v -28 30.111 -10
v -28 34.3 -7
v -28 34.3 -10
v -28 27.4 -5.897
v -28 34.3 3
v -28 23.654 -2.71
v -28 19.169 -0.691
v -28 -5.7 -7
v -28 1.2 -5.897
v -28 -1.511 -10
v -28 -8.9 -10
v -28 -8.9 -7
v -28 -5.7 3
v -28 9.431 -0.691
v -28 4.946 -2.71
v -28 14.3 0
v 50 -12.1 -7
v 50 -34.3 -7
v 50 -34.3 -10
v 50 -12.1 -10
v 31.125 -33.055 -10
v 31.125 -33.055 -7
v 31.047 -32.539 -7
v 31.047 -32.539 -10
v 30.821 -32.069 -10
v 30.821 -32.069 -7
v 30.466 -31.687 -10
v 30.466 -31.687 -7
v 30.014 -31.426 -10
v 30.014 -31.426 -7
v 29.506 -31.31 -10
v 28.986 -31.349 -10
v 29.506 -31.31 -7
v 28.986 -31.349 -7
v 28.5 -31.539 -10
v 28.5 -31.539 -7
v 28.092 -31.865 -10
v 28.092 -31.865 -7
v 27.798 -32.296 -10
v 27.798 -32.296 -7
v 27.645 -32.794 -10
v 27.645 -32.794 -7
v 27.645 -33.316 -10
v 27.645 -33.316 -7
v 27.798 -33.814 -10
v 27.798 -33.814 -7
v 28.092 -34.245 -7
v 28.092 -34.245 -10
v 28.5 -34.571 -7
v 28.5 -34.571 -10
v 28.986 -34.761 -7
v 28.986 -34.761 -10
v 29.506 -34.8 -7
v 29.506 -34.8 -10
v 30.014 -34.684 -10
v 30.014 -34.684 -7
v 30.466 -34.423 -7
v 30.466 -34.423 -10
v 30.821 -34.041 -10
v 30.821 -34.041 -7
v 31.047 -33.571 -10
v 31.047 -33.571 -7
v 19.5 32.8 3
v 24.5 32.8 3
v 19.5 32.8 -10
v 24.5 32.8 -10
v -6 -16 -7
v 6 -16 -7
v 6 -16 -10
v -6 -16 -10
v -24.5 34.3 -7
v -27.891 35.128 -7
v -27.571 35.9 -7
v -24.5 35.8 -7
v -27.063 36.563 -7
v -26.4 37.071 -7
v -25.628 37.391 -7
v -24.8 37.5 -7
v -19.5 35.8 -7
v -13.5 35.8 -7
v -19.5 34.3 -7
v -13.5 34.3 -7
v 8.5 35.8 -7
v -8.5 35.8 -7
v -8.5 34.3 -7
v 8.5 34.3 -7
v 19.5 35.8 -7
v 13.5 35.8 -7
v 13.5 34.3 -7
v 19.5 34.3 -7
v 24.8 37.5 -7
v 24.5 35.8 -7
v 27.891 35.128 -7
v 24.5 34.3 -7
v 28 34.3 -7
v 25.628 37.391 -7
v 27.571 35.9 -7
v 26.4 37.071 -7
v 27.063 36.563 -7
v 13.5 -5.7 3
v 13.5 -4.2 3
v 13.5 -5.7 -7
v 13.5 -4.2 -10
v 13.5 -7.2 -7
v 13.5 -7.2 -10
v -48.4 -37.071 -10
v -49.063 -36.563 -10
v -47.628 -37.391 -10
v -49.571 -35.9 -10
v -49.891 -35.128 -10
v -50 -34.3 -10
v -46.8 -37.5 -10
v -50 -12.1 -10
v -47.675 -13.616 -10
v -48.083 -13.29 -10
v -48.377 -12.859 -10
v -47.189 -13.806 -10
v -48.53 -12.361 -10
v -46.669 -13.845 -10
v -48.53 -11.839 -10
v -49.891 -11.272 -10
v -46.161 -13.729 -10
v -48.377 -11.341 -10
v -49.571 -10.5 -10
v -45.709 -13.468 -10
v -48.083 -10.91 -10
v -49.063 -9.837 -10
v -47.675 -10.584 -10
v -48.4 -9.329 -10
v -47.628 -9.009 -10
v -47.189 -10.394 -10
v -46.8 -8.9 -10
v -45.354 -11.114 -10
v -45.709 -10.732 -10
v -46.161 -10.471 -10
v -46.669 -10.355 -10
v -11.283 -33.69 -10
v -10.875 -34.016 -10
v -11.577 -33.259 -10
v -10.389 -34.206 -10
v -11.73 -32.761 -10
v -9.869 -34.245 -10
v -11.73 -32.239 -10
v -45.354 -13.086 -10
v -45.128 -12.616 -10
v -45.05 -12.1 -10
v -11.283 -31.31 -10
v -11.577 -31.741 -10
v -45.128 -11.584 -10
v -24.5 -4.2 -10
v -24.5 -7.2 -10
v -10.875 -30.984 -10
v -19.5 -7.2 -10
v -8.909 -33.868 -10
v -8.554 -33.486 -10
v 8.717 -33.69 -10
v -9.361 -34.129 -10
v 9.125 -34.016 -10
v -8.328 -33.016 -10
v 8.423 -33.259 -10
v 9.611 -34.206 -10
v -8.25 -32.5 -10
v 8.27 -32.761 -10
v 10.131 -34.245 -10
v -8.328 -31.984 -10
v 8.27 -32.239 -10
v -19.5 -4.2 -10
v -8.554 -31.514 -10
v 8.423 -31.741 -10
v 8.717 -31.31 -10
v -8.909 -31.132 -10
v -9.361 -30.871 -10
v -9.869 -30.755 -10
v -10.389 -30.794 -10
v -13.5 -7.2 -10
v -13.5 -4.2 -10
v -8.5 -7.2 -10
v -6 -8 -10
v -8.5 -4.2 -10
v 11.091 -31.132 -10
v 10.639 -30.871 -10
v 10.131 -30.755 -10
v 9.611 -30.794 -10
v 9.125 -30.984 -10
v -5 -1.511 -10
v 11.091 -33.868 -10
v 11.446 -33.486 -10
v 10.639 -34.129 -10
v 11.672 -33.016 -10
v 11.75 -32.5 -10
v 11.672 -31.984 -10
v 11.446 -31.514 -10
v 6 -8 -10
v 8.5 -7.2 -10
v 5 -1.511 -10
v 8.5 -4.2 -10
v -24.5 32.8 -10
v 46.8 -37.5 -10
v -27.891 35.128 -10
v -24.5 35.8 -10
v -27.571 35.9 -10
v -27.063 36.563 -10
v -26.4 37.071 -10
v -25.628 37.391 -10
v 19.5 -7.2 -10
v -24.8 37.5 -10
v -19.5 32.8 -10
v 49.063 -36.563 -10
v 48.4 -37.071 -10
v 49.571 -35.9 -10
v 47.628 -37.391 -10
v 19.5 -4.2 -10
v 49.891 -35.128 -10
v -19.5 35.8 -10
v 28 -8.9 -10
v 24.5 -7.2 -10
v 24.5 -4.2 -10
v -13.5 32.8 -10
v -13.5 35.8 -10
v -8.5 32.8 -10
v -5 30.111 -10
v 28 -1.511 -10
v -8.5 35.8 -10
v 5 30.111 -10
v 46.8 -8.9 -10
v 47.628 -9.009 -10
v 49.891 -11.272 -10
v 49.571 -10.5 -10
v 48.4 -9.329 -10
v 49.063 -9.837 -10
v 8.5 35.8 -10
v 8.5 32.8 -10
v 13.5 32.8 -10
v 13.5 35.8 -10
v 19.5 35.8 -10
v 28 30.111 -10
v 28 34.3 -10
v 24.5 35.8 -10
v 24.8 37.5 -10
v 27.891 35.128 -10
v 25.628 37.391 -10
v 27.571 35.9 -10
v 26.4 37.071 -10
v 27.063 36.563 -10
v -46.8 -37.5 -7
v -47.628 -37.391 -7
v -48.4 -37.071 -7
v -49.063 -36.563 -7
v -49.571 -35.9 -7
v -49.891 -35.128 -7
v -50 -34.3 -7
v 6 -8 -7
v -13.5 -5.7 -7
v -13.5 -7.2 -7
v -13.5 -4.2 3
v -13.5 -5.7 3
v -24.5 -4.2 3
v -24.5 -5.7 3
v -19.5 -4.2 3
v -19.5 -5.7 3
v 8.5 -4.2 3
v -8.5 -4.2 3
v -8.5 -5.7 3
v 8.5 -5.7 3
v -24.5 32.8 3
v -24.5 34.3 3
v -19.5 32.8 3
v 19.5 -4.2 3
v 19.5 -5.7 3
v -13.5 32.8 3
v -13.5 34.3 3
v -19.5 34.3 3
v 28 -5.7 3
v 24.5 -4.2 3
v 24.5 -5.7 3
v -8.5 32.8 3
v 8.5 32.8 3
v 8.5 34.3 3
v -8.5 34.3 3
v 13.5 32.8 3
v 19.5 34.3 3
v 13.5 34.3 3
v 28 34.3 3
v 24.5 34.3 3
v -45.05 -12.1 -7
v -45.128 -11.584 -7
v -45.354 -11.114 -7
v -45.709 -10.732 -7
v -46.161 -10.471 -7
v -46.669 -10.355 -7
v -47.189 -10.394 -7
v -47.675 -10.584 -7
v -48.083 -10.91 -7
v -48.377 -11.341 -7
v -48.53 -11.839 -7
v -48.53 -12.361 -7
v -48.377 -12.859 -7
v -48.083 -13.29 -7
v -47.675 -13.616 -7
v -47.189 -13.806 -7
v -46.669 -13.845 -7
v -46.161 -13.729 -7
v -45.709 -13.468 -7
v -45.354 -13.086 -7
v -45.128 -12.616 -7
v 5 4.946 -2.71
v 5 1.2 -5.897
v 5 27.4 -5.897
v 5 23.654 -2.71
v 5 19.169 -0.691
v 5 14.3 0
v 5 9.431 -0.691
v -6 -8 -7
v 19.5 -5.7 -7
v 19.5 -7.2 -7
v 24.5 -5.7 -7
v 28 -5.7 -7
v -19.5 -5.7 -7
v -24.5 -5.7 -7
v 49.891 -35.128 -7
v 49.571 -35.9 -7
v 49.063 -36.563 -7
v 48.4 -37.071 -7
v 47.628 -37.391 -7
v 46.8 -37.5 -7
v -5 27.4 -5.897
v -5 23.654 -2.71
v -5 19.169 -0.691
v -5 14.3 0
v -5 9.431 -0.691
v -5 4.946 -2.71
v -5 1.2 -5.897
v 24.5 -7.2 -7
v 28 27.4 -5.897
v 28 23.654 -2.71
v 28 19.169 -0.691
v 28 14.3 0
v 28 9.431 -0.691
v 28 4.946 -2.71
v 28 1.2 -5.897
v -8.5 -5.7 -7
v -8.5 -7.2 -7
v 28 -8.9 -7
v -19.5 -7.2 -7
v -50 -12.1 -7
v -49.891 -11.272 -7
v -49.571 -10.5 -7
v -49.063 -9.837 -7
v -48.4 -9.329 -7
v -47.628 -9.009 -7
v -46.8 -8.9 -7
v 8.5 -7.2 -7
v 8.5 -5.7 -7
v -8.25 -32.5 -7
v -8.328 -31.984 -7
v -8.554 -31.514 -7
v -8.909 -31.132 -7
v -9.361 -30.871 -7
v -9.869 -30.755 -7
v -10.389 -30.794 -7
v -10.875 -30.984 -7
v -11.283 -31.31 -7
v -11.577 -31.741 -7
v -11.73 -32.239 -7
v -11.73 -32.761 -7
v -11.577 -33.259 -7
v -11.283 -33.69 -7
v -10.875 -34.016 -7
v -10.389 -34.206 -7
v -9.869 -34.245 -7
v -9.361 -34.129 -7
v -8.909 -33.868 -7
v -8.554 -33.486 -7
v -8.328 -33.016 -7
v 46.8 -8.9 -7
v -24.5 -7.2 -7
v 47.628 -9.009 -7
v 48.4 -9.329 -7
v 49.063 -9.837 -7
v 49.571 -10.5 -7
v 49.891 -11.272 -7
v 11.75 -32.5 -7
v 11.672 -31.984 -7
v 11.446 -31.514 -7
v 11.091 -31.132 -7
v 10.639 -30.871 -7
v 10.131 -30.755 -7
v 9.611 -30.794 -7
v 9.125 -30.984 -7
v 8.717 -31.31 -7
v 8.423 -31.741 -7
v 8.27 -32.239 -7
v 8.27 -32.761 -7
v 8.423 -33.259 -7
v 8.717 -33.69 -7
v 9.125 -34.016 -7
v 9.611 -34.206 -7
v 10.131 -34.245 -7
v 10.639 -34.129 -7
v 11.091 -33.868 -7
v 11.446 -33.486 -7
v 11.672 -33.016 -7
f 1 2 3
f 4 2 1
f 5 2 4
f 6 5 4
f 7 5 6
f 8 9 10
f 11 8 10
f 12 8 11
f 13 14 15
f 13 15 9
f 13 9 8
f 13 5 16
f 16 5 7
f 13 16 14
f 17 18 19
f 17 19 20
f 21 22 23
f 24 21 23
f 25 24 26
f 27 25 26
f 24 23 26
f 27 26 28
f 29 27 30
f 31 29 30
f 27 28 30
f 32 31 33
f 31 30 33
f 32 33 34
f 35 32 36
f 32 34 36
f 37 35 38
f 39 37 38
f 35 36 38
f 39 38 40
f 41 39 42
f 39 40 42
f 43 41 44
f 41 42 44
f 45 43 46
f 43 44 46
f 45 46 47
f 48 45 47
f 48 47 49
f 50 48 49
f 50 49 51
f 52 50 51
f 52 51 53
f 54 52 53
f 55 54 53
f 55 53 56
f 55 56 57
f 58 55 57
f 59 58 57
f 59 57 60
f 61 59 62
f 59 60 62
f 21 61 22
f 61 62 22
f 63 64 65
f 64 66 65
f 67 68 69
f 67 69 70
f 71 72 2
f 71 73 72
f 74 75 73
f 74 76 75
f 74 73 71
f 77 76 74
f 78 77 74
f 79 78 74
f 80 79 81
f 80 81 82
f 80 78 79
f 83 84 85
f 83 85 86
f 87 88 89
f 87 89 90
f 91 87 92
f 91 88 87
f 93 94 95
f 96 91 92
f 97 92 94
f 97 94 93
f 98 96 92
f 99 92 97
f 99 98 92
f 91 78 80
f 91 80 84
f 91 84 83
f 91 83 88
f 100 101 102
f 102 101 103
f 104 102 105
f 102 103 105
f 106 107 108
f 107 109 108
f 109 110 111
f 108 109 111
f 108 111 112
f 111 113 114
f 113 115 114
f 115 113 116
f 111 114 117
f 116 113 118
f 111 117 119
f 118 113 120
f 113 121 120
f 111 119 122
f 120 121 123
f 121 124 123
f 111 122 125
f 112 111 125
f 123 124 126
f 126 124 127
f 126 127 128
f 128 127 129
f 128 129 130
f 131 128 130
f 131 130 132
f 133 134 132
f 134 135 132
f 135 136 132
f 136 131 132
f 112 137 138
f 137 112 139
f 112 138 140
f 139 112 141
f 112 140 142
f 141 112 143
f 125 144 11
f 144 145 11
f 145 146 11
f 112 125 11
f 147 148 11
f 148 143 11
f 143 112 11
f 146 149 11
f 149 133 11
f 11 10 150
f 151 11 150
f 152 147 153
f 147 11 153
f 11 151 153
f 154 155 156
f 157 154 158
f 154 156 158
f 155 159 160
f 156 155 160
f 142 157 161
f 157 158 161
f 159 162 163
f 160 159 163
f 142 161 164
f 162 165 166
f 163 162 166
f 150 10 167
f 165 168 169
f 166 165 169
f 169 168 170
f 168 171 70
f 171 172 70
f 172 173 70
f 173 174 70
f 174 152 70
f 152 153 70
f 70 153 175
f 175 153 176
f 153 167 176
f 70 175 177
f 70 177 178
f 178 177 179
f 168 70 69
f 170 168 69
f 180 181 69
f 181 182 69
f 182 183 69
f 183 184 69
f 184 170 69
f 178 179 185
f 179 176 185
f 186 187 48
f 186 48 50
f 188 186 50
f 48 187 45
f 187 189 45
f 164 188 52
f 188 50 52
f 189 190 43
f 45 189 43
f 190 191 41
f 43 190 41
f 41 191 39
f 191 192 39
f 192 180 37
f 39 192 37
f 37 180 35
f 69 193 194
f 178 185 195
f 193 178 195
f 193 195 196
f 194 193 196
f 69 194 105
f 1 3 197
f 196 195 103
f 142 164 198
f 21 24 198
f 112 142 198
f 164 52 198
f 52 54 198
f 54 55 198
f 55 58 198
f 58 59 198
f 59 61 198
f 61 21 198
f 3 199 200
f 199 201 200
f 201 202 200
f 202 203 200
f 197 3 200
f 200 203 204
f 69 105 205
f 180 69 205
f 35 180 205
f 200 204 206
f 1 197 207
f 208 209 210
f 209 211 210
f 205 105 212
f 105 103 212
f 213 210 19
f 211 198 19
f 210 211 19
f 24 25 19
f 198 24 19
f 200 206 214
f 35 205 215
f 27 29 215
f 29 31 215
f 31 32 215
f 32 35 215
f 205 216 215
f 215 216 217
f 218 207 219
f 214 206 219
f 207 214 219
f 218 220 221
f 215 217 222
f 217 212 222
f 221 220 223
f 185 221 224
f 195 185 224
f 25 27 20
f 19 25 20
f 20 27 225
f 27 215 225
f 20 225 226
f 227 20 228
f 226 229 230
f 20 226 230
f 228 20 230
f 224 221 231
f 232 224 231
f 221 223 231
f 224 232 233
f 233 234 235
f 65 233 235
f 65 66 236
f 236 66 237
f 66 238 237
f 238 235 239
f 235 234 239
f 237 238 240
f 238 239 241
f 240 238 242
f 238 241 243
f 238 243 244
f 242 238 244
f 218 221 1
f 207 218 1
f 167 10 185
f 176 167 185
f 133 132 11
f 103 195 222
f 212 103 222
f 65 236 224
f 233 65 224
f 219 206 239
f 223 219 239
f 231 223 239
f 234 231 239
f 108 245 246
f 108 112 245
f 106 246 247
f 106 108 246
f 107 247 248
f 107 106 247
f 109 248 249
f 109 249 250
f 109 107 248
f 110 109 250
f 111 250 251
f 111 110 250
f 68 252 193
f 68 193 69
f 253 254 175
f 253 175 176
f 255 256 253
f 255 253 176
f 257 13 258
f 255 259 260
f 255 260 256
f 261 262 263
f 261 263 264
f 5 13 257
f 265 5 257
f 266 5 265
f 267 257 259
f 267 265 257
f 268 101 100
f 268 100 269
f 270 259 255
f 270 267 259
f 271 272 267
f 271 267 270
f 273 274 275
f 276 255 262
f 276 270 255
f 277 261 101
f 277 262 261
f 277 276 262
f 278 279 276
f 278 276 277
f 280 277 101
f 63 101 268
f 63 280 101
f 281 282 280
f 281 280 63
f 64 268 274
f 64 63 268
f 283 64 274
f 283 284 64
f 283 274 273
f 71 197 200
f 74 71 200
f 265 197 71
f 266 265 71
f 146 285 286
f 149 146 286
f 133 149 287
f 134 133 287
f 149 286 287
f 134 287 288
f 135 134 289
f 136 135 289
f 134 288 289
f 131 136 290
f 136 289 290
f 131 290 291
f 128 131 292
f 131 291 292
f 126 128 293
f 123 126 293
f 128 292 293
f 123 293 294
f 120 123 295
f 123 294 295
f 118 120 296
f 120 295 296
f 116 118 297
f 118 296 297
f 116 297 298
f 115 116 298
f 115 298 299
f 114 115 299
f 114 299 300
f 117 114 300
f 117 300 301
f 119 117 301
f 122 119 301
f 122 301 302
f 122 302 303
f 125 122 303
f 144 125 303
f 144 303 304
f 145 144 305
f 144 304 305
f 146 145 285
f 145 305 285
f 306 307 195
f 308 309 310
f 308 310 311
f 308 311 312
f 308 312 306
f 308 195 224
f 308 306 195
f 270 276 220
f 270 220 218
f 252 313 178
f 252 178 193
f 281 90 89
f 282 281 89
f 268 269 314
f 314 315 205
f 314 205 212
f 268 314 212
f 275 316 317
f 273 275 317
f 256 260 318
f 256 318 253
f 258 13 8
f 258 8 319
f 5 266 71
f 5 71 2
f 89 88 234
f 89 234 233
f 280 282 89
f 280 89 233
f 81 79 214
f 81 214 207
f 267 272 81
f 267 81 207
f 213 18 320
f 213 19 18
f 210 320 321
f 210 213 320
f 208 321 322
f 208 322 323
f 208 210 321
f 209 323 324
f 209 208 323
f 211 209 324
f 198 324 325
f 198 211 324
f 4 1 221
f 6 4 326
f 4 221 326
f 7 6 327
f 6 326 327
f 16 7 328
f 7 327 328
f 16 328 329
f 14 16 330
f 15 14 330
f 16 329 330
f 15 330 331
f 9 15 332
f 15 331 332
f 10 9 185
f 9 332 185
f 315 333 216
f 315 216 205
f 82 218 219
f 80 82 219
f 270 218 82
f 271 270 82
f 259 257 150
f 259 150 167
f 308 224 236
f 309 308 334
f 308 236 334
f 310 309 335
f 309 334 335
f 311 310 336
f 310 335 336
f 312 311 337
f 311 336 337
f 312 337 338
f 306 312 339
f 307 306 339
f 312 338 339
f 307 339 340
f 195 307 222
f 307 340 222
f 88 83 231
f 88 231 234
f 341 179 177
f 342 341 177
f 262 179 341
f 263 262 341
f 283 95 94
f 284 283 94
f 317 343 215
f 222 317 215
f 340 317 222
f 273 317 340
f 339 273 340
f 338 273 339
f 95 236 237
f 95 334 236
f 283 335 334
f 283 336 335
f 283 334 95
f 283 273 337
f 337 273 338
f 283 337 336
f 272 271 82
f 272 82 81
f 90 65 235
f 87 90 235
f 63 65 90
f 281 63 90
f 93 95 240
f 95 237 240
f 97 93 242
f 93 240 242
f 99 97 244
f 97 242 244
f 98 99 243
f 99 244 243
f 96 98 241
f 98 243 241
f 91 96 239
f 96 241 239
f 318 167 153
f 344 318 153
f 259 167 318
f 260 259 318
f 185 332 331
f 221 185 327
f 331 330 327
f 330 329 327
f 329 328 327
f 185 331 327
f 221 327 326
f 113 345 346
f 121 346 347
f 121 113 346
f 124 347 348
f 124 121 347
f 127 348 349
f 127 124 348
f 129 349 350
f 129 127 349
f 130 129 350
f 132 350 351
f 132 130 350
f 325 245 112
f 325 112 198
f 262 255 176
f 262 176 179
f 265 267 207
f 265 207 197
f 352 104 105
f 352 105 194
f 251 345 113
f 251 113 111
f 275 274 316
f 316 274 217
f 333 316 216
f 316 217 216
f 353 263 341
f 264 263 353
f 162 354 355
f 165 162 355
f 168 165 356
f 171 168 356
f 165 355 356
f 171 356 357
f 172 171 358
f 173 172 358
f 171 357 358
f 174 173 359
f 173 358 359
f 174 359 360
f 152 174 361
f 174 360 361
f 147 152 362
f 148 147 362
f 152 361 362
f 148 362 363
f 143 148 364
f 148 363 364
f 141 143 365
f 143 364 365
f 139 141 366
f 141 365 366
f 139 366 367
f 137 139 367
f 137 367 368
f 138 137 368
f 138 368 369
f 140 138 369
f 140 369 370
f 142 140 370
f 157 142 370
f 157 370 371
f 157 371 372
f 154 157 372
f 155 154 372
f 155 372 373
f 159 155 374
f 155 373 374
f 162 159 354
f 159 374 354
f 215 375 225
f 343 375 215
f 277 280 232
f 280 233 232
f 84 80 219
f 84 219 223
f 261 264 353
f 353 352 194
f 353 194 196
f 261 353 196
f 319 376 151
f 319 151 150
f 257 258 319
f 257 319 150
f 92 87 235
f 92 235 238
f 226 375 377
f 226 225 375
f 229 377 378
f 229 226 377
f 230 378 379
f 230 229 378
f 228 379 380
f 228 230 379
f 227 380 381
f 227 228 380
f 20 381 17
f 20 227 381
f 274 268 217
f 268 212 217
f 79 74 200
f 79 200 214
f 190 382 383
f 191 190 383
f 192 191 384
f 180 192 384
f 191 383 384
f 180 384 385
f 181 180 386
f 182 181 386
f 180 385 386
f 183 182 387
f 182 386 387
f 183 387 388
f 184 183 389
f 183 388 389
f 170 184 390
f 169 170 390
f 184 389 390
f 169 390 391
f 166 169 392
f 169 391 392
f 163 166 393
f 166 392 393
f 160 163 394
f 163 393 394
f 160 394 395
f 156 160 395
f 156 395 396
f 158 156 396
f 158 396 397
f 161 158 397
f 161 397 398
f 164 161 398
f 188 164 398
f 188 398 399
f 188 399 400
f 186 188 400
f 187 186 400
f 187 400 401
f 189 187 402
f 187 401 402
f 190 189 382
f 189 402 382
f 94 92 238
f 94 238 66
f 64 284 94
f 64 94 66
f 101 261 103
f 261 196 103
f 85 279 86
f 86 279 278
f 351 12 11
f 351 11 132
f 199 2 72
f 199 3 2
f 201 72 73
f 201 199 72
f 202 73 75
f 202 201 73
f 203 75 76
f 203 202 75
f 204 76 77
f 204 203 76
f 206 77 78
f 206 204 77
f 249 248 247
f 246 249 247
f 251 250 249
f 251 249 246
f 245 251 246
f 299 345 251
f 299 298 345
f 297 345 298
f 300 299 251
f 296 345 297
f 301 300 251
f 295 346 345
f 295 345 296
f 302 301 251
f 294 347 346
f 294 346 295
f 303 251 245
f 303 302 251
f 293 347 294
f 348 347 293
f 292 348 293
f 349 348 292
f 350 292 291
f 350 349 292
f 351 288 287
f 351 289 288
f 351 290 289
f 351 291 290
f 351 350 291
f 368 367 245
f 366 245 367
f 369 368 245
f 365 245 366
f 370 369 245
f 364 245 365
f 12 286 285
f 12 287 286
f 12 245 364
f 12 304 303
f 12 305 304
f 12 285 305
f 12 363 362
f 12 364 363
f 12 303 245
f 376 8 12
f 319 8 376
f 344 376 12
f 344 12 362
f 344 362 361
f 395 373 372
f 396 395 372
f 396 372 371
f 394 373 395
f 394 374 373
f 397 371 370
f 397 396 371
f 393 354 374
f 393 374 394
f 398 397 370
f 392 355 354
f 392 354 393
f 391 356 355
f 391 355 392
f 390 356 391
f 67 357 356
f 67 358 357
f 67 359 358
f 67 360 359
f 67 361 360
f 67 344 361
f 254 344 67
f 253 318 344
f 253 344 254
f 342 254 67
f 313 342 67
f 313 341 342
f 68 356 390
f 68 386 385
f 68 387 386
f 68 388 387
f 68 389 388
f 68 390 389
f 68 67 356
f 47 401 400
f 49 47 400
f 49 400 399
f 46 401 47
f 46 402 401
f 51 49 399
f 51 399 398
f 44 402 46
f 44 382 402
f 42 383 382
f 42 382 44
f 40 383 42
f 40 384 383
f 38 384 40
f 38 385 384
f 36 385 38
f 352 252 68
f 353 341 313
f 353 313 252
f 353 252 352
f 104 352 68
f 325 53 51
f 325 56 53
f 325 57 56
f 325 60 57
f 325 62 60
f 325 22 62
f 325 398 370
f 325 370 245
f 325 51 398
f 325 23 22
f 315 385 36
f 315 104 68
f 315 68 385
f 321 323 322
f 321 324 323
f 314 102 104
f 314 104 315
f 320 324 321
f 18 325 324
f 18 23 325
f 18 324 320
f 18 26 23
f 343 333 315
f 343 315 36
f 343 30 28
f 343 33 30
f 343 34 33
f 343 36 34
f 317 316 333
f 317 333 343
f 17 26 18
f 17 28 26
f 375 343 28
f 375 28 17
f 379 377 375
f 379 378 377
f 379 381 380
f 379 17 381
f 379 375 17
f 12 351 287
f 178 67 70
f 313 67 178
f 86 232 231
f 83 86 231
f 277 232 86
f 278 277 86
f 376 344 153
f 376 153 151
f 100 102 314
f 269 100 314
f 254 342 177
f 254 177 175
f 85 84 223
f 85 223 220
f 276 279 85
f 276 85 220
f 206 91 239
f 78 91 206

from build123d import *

# Parameters (mm, degrees)
F0_W     = 10
F0_H     = 40
F1_DEPTH = 3
F2_DEPTH = 10
F4_DEPTH = 56
F5_DEPTH = 10
F6_START = -7
F0_R     = 1.75
F6_DEPTH = 3
F7_R     = 3.2


with BuildPart() as f1:
    # F0 (on Top) → F1 (new body)
    with BuildSketch(Plane.XY):
        with Locations((0, 14.3)):
            Rectangle(F0_W, F0_H)
        Polygon((-28, 14.3), (-28, -5.7), (-24.5, -5.7), (-24.5, -4.2), (-19.5, -4.2), (-19.5, -5.7), (-13.5, -5.7), (-13.5, -4.2), (-8.5, -4.2), (-8.5, -5.7), (-5, -5.7), (-5, 34.3), (-8.5, 34.3), (-8.5, 32.8), (-13.5, 32.8), (-13.5, 34.3), (-19.5, 34.3), (-19.5, 32.8), (-24.5, 32.8), (-24.5, 34.3), (-28, 34.3), align=None)
        Polygon((24.5, -5.7), (28, -5.7), (28, 34.3), (24.5, 34.3), (24.5, 32.8), (19.5, 32.8), (19.5, 34.3), (13.5, 34.3), (13.5, 32.8), (8.5, 32.8), (8.5, 34.3), (5, 34.3), (5, -5.7), (8.5, -5.7), (8.5, -4.2), (13.5, -4.2), (13.5, -5.7), (19.5, -5.7), (19.5, -4.2), (24.5, -4.2), align=None)
    extrude(amount=F1_DEPTH)

    # F0 (on Top) → F2 (join)
    with BuildSketch(Plane.XY):
        Polygon((-28, 14.3), (-28, -5.7), (-24.5, -5.7), (-24.5, -4.2), (-19.5, -4.2), (-19.5, -5.7), (-13.5, -5.7), (-13.5, -4.2), (-8.5, -4.2), (-8.5, -5.7), (-5, -5.7), (-5, 34.3), (-8.5, 34.3), (-8.5, 32.8), (-13.5, 32.8), (-13.5, 34.3), (-19.5, 34.3), (-19.5, 32.8), (-24.5, 32.8), (-24.5, 34.3), (-28, 34.3), align=None)
        Polygon((24.5, -5.7), (28, -5.7), (28, 34.3), (24.5, 34.3), (24.5, 32.8), (19.5, 32.8), (19.5, 34.3), (13.5, 34.3), (13.5, 32.8), (8.5, 32.8), (8.5, 34.3), (5, 34.3), (5, -5.7), (8.5, -5.7), (8.5, -4.2), (13.5, -4.2), (13.5, -5.7), (19.5, -5.7), (19.5, -4.2), (24.5, -4.2), align=None)
    extrude(amount=-F2_DEPTH)

    # F3 (on face) → F4 (cut, through all)
    with BuildSketch(Plane.YZ.offset(28)):
        with BuildLine():
            Line((-1.5113883008, -10), (30.1113883008, -10))
            ThreePointArc((30.1113883008, -10), (14.3, 0), (-1.5113883008, -10))
        make_face()
    extrude(amount=-F4_DEPTH, mode=Mode.SUBTRACT)

    # F0 (on Top) → F5 (join, through all)
    with BuildSketch(Plane.XY):
        with Locations((0, 14.3)):
            Rectangle(F0_W, F0_H)
    extrude(amount=-F5_DEPTH)

    # F0 (on Top) → F6 (join)
    with BuildSketch(Plane.XY.offset(F6_START)):
        Polygon((-28, 37.5), (-28, 34.3), (-24.5, 34.3), (-24.5, 35.8), (-19.5, 35.8), (-19.5, 34.3), (-13.5, 34.3), (-13.5, 35.8), (-8.5, 35.8), (-8.5, 34.3), (-5, 34.3), (5, 34.3), (8.5, 34.3), (8.5, 35.8), (13.5, 35.8), (13.5, 34.3), (19.5, 34.3), (19.5, 35.8), (24.5, 35.8), (24.5, 34.3), (28, 34.3), (28, 37.5), align=None)
        Polygon((-28, -5.7), (-28, -8.9), (-6, -8.9), (-6, -8), (6, -8), (6, -8.9), (28, -8.9), (28, -5.7), (24.5, -5.7), (24.5, -7.2), (19.5, -7.2), (19.5, -5.7), (13.5, -5.7), (13.5, -7.2), (8.5, -7.2), (8.5, -5.7), (5, -5.7), (-5, -5.7), (-8.5, -5.7), (-8.5, -7.2), (-13.5, -7.2), (-13.5, -5.7), (-19.5, -5.7), (-19.5, -7.2), (-24.5, -7.2), (-24.5, -5.7), align=None)
        Polygon((-50, -37.5), (-28, -37.5), (0, -37.5), (28, -37.5), (50, -37.5), (50, -8.9), (28, -8.9), (6, -8.9), (6, -16), (-6, -16), (-6, -8.9), (-28, -8.9), (-50, -8.9), align=None)
        with Locations((-10, -32.5)):
            Circle(F0_R, mode=Mode.SUBTRACT)
        with Locations((-46.8, -12.1)):
            Circle(F0_R, mode=Mode.SUBTRACT)
        with Locations((10, -32.5)):
            Circle(F0_R, mode=Mode.SUBTRACT)
        with Locations((29.375, -33.055)):
            Circle(F0_R, mode=Mode.SUBTRACT)
    extrude(amount=-F6_DEPTH)

    # F7
    f7_edges = [f1.edges().sort_by_distance(p)[0] for p in [
        (28, 37.5, -8.5),
        (-28, 37.5, -8.5),
        (50, -8.9, -8.5),
        (50, -37.5, -8.5),
        (-50, -37.5, -8.5),
        (-50, -8.9, -8.5),
    ]]
    fillet(f7_edges, radius=F7_R)


solid = f1.part
